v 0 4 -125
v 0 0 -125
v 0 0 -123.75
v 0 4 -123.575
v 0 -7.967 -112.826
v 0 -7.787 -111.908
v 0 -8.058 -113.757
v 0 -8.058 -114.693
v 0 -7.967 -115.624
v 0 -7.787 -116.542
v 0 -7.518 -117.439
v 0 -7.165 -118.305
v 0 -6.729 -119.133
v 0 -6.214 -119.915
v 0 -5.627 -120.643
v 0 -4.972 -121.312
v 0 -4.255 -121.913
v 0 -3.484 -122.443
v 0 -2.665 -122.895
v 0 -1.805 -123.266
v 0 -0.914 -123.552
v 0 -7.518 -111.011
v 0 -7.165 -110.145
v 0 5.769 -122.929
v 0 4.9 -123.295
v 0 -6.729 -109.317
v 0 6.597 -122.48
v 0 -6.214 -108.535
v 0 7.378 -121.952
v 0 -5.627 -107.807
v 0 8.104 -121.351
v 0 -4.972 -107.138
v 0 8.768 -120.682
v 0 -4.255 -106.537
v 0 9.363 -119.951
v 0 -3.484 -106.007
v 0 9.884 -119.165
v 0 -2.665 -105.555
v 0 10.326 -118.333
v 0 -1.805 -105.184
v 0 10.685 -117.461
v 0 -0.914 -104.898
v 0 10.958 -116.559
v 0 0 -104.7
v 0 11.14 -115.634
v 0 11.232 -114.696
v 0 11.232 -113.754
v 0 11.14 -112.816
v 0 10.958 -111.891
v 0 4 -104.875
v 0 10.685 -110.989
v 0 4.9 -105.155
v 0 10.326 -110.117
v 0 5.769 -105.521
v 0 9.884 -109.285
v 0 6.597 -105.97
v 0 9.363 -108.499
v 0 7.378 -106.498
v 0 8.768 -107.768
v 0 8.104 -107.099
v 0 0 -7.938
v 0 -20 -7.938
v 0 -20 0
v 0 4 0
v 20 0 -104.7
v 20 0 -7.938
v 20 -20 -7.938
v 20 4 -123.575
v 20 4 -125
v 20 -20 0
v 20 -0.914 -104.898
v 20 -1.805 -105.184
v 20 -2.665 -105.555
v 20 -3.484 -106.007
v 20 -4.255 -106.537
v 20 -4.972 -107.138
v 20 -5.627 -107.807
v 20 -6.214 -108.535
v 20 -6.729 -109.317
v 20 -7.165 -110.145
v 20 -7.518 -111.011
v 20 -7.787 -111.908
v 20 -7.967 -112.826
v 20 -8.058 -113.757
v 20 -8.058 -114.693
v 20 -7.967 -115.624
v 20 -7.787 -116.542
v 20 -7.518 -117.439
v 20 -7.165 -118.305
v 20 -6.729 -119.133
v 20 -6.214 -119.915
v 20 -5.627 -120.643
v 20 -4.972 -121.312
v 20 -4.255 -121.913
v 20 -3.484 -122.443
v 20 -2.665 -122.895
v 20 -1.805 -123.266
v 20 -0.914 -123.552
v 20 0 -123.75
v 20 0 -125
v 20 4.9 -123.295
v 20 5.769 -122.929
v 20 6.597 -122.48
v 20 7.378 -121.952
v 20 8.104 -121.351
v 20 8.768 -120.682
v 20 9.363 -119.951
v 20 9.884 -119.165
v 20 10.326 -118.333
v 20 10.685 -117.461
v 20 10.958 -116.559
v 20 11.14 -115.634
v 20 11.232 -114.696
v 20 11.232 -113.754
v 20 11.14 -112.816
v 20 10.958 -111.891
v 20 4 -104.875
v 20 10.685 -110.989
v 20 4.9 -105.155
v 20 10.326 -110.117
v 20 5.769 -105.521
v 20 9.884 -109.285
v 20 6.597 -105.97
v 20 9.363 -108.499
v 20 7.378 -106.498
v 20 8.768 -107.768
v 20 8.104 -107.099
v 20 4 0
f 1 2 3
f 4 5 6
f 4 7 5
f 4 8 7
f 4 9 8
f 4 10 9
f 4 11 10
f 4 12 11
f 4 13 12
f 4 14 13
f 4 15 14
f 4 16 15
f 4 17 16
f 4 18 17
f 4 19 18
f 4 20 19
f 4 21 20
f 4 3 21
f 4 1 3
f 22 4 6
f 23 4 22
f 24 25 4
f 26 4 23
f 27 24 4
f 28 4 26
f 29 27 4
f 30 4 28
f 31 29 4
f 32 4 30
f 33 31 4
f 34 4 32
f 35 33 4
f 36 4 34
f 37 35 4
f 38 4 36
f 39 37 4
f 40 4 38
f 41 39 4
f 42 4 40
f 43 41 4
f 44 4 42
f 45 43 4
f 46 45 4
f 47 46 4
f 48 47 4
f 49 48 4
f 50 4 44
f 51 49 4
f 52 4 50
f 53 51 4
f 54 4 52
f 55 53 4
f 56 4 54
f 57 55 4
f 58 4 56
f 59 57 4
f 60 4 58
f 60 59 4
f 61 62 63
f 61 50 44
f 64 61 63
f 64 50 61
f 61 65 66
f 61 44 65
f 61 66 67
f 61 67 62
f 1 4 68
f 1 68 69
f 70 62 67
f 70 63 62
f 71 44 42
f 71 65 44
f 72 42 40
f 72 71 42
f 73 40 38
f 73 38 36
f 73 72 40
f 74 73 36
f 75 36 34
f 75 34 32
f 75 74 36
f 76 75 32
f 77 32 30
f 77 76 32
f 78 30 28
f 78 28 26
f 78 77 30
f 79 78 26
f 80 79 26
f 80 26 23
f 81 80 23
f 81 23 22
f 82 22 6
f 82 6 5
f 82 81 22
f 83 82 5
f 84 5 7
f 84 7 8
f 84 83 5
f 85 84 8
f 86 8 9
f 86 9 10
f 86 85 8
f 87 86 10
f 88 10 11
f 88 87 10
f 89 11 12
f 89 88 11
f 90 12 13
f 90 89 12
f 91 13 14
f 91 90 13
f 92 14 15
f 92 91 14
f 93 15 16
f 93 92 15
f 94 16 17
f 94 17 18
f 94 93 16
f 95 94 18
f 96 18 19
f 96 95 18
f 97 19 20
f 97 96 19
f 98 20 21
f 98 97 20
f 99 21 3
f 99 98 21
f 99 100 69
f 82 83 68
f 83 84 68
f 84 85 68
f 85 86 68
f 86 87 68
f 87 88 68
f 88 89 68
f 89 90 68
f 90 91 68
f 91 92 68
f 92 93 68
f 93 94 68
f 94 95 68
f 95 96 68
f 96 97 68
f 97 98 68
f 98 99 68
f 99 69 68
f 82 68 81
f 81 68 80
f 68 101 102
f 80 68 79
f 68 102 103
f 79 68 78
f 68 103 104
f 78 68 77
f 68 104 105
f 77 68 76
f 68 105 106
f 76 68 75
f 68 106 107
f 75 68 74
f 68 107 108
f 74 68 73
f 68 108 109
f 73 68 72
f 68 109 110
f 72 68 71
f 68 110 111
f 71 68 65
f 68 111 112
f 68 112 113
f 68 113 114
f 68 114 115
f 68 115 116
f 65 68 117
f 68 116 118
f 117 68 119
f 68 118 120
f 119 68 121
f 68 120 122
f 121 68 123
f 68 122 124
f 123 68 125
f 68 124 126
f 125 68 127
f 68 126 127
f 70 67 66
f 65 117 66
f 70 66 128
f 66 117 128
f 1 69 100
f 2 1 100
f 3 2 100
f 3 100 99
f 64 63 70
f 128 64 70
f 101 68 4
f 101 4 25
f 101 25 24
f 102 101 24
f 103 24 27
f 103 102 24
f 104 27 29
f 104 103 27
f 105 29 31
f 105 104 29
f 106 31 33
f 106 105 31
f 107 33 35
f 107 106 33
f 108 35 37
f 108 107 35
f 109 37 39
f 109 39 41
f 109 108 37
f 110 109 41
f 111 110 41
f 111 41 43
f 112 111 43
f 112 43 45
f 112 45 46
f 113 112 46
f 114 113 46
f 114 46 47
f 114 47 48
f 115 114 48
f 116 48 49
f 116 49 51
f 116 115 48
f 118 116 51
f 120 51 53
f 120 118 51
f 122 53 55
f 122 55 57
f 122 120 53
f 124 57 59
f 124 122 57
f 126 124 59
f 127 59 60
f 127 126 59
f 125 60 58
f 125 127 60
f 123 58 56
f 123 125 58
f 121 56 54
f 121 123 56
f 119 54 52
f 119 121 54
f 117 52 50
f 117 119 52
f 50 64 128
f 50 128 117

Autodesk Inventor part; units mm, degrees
ref_plane "YZ Plane" through (0, 0, 0) normal (1, 0, 0) x (0, 1, 0)
ref_plane "XZ Plane" through (0, 0, 0) normal (0, 1, 0) x (-1, 0, 0)
ref_plane "XY Plane" through (0, 0, 0) normal (0, 0, 1) x (1, 0, 0)
sketch "Эскиз1" plane through (0, 0, 0) normal (1, 0, 0) x (0, 1, 0)
  line L0 (0, 0) -> (4, 0)
  line L1 (4, 0) -> (4, -125)
  line L2 (4, -125) -> (0, -125)
  line L3 (0, -125) -> (0, 0)
  dimension "d0" = 4
  dimension "d1" = 125
extrude "Выдавливание1" add sketch "Эскиз1" along normal blind 20
sketch "Эскиз3" plane through (20, 0, 0) normal (1, 0, 0) x (0, 0, -1)
  circle A0 centre (114.225, 1.5875) radius 9.6564
  line L0 (125, 0) -> (125, 4) projected
  point P0 (0, 0)
  dimension "d8" = 10.775
extrude "Выдавливание3" add sketch "Эскиз3" against normal blind 20
sketch "Эскиз5" plane through (0, 0, 0) normal (0, -1, 0) x (1, 0, 0)
  line L0 (20, -104.8748) -> (20, 0) projected
  line L1 (0, 0) -> (20, 0)
  line L2 (20, 0) -> (20, -7.9375)
  line L3 (20, -7.9375) -> (0, -7.9375)
  line L4 (0, -7.9375) -> (0, 0)
extrude "Выдавливание5" add sketch "Эскиз5" along normal blind 20
properties part number "ПАЛЬЧИК"
